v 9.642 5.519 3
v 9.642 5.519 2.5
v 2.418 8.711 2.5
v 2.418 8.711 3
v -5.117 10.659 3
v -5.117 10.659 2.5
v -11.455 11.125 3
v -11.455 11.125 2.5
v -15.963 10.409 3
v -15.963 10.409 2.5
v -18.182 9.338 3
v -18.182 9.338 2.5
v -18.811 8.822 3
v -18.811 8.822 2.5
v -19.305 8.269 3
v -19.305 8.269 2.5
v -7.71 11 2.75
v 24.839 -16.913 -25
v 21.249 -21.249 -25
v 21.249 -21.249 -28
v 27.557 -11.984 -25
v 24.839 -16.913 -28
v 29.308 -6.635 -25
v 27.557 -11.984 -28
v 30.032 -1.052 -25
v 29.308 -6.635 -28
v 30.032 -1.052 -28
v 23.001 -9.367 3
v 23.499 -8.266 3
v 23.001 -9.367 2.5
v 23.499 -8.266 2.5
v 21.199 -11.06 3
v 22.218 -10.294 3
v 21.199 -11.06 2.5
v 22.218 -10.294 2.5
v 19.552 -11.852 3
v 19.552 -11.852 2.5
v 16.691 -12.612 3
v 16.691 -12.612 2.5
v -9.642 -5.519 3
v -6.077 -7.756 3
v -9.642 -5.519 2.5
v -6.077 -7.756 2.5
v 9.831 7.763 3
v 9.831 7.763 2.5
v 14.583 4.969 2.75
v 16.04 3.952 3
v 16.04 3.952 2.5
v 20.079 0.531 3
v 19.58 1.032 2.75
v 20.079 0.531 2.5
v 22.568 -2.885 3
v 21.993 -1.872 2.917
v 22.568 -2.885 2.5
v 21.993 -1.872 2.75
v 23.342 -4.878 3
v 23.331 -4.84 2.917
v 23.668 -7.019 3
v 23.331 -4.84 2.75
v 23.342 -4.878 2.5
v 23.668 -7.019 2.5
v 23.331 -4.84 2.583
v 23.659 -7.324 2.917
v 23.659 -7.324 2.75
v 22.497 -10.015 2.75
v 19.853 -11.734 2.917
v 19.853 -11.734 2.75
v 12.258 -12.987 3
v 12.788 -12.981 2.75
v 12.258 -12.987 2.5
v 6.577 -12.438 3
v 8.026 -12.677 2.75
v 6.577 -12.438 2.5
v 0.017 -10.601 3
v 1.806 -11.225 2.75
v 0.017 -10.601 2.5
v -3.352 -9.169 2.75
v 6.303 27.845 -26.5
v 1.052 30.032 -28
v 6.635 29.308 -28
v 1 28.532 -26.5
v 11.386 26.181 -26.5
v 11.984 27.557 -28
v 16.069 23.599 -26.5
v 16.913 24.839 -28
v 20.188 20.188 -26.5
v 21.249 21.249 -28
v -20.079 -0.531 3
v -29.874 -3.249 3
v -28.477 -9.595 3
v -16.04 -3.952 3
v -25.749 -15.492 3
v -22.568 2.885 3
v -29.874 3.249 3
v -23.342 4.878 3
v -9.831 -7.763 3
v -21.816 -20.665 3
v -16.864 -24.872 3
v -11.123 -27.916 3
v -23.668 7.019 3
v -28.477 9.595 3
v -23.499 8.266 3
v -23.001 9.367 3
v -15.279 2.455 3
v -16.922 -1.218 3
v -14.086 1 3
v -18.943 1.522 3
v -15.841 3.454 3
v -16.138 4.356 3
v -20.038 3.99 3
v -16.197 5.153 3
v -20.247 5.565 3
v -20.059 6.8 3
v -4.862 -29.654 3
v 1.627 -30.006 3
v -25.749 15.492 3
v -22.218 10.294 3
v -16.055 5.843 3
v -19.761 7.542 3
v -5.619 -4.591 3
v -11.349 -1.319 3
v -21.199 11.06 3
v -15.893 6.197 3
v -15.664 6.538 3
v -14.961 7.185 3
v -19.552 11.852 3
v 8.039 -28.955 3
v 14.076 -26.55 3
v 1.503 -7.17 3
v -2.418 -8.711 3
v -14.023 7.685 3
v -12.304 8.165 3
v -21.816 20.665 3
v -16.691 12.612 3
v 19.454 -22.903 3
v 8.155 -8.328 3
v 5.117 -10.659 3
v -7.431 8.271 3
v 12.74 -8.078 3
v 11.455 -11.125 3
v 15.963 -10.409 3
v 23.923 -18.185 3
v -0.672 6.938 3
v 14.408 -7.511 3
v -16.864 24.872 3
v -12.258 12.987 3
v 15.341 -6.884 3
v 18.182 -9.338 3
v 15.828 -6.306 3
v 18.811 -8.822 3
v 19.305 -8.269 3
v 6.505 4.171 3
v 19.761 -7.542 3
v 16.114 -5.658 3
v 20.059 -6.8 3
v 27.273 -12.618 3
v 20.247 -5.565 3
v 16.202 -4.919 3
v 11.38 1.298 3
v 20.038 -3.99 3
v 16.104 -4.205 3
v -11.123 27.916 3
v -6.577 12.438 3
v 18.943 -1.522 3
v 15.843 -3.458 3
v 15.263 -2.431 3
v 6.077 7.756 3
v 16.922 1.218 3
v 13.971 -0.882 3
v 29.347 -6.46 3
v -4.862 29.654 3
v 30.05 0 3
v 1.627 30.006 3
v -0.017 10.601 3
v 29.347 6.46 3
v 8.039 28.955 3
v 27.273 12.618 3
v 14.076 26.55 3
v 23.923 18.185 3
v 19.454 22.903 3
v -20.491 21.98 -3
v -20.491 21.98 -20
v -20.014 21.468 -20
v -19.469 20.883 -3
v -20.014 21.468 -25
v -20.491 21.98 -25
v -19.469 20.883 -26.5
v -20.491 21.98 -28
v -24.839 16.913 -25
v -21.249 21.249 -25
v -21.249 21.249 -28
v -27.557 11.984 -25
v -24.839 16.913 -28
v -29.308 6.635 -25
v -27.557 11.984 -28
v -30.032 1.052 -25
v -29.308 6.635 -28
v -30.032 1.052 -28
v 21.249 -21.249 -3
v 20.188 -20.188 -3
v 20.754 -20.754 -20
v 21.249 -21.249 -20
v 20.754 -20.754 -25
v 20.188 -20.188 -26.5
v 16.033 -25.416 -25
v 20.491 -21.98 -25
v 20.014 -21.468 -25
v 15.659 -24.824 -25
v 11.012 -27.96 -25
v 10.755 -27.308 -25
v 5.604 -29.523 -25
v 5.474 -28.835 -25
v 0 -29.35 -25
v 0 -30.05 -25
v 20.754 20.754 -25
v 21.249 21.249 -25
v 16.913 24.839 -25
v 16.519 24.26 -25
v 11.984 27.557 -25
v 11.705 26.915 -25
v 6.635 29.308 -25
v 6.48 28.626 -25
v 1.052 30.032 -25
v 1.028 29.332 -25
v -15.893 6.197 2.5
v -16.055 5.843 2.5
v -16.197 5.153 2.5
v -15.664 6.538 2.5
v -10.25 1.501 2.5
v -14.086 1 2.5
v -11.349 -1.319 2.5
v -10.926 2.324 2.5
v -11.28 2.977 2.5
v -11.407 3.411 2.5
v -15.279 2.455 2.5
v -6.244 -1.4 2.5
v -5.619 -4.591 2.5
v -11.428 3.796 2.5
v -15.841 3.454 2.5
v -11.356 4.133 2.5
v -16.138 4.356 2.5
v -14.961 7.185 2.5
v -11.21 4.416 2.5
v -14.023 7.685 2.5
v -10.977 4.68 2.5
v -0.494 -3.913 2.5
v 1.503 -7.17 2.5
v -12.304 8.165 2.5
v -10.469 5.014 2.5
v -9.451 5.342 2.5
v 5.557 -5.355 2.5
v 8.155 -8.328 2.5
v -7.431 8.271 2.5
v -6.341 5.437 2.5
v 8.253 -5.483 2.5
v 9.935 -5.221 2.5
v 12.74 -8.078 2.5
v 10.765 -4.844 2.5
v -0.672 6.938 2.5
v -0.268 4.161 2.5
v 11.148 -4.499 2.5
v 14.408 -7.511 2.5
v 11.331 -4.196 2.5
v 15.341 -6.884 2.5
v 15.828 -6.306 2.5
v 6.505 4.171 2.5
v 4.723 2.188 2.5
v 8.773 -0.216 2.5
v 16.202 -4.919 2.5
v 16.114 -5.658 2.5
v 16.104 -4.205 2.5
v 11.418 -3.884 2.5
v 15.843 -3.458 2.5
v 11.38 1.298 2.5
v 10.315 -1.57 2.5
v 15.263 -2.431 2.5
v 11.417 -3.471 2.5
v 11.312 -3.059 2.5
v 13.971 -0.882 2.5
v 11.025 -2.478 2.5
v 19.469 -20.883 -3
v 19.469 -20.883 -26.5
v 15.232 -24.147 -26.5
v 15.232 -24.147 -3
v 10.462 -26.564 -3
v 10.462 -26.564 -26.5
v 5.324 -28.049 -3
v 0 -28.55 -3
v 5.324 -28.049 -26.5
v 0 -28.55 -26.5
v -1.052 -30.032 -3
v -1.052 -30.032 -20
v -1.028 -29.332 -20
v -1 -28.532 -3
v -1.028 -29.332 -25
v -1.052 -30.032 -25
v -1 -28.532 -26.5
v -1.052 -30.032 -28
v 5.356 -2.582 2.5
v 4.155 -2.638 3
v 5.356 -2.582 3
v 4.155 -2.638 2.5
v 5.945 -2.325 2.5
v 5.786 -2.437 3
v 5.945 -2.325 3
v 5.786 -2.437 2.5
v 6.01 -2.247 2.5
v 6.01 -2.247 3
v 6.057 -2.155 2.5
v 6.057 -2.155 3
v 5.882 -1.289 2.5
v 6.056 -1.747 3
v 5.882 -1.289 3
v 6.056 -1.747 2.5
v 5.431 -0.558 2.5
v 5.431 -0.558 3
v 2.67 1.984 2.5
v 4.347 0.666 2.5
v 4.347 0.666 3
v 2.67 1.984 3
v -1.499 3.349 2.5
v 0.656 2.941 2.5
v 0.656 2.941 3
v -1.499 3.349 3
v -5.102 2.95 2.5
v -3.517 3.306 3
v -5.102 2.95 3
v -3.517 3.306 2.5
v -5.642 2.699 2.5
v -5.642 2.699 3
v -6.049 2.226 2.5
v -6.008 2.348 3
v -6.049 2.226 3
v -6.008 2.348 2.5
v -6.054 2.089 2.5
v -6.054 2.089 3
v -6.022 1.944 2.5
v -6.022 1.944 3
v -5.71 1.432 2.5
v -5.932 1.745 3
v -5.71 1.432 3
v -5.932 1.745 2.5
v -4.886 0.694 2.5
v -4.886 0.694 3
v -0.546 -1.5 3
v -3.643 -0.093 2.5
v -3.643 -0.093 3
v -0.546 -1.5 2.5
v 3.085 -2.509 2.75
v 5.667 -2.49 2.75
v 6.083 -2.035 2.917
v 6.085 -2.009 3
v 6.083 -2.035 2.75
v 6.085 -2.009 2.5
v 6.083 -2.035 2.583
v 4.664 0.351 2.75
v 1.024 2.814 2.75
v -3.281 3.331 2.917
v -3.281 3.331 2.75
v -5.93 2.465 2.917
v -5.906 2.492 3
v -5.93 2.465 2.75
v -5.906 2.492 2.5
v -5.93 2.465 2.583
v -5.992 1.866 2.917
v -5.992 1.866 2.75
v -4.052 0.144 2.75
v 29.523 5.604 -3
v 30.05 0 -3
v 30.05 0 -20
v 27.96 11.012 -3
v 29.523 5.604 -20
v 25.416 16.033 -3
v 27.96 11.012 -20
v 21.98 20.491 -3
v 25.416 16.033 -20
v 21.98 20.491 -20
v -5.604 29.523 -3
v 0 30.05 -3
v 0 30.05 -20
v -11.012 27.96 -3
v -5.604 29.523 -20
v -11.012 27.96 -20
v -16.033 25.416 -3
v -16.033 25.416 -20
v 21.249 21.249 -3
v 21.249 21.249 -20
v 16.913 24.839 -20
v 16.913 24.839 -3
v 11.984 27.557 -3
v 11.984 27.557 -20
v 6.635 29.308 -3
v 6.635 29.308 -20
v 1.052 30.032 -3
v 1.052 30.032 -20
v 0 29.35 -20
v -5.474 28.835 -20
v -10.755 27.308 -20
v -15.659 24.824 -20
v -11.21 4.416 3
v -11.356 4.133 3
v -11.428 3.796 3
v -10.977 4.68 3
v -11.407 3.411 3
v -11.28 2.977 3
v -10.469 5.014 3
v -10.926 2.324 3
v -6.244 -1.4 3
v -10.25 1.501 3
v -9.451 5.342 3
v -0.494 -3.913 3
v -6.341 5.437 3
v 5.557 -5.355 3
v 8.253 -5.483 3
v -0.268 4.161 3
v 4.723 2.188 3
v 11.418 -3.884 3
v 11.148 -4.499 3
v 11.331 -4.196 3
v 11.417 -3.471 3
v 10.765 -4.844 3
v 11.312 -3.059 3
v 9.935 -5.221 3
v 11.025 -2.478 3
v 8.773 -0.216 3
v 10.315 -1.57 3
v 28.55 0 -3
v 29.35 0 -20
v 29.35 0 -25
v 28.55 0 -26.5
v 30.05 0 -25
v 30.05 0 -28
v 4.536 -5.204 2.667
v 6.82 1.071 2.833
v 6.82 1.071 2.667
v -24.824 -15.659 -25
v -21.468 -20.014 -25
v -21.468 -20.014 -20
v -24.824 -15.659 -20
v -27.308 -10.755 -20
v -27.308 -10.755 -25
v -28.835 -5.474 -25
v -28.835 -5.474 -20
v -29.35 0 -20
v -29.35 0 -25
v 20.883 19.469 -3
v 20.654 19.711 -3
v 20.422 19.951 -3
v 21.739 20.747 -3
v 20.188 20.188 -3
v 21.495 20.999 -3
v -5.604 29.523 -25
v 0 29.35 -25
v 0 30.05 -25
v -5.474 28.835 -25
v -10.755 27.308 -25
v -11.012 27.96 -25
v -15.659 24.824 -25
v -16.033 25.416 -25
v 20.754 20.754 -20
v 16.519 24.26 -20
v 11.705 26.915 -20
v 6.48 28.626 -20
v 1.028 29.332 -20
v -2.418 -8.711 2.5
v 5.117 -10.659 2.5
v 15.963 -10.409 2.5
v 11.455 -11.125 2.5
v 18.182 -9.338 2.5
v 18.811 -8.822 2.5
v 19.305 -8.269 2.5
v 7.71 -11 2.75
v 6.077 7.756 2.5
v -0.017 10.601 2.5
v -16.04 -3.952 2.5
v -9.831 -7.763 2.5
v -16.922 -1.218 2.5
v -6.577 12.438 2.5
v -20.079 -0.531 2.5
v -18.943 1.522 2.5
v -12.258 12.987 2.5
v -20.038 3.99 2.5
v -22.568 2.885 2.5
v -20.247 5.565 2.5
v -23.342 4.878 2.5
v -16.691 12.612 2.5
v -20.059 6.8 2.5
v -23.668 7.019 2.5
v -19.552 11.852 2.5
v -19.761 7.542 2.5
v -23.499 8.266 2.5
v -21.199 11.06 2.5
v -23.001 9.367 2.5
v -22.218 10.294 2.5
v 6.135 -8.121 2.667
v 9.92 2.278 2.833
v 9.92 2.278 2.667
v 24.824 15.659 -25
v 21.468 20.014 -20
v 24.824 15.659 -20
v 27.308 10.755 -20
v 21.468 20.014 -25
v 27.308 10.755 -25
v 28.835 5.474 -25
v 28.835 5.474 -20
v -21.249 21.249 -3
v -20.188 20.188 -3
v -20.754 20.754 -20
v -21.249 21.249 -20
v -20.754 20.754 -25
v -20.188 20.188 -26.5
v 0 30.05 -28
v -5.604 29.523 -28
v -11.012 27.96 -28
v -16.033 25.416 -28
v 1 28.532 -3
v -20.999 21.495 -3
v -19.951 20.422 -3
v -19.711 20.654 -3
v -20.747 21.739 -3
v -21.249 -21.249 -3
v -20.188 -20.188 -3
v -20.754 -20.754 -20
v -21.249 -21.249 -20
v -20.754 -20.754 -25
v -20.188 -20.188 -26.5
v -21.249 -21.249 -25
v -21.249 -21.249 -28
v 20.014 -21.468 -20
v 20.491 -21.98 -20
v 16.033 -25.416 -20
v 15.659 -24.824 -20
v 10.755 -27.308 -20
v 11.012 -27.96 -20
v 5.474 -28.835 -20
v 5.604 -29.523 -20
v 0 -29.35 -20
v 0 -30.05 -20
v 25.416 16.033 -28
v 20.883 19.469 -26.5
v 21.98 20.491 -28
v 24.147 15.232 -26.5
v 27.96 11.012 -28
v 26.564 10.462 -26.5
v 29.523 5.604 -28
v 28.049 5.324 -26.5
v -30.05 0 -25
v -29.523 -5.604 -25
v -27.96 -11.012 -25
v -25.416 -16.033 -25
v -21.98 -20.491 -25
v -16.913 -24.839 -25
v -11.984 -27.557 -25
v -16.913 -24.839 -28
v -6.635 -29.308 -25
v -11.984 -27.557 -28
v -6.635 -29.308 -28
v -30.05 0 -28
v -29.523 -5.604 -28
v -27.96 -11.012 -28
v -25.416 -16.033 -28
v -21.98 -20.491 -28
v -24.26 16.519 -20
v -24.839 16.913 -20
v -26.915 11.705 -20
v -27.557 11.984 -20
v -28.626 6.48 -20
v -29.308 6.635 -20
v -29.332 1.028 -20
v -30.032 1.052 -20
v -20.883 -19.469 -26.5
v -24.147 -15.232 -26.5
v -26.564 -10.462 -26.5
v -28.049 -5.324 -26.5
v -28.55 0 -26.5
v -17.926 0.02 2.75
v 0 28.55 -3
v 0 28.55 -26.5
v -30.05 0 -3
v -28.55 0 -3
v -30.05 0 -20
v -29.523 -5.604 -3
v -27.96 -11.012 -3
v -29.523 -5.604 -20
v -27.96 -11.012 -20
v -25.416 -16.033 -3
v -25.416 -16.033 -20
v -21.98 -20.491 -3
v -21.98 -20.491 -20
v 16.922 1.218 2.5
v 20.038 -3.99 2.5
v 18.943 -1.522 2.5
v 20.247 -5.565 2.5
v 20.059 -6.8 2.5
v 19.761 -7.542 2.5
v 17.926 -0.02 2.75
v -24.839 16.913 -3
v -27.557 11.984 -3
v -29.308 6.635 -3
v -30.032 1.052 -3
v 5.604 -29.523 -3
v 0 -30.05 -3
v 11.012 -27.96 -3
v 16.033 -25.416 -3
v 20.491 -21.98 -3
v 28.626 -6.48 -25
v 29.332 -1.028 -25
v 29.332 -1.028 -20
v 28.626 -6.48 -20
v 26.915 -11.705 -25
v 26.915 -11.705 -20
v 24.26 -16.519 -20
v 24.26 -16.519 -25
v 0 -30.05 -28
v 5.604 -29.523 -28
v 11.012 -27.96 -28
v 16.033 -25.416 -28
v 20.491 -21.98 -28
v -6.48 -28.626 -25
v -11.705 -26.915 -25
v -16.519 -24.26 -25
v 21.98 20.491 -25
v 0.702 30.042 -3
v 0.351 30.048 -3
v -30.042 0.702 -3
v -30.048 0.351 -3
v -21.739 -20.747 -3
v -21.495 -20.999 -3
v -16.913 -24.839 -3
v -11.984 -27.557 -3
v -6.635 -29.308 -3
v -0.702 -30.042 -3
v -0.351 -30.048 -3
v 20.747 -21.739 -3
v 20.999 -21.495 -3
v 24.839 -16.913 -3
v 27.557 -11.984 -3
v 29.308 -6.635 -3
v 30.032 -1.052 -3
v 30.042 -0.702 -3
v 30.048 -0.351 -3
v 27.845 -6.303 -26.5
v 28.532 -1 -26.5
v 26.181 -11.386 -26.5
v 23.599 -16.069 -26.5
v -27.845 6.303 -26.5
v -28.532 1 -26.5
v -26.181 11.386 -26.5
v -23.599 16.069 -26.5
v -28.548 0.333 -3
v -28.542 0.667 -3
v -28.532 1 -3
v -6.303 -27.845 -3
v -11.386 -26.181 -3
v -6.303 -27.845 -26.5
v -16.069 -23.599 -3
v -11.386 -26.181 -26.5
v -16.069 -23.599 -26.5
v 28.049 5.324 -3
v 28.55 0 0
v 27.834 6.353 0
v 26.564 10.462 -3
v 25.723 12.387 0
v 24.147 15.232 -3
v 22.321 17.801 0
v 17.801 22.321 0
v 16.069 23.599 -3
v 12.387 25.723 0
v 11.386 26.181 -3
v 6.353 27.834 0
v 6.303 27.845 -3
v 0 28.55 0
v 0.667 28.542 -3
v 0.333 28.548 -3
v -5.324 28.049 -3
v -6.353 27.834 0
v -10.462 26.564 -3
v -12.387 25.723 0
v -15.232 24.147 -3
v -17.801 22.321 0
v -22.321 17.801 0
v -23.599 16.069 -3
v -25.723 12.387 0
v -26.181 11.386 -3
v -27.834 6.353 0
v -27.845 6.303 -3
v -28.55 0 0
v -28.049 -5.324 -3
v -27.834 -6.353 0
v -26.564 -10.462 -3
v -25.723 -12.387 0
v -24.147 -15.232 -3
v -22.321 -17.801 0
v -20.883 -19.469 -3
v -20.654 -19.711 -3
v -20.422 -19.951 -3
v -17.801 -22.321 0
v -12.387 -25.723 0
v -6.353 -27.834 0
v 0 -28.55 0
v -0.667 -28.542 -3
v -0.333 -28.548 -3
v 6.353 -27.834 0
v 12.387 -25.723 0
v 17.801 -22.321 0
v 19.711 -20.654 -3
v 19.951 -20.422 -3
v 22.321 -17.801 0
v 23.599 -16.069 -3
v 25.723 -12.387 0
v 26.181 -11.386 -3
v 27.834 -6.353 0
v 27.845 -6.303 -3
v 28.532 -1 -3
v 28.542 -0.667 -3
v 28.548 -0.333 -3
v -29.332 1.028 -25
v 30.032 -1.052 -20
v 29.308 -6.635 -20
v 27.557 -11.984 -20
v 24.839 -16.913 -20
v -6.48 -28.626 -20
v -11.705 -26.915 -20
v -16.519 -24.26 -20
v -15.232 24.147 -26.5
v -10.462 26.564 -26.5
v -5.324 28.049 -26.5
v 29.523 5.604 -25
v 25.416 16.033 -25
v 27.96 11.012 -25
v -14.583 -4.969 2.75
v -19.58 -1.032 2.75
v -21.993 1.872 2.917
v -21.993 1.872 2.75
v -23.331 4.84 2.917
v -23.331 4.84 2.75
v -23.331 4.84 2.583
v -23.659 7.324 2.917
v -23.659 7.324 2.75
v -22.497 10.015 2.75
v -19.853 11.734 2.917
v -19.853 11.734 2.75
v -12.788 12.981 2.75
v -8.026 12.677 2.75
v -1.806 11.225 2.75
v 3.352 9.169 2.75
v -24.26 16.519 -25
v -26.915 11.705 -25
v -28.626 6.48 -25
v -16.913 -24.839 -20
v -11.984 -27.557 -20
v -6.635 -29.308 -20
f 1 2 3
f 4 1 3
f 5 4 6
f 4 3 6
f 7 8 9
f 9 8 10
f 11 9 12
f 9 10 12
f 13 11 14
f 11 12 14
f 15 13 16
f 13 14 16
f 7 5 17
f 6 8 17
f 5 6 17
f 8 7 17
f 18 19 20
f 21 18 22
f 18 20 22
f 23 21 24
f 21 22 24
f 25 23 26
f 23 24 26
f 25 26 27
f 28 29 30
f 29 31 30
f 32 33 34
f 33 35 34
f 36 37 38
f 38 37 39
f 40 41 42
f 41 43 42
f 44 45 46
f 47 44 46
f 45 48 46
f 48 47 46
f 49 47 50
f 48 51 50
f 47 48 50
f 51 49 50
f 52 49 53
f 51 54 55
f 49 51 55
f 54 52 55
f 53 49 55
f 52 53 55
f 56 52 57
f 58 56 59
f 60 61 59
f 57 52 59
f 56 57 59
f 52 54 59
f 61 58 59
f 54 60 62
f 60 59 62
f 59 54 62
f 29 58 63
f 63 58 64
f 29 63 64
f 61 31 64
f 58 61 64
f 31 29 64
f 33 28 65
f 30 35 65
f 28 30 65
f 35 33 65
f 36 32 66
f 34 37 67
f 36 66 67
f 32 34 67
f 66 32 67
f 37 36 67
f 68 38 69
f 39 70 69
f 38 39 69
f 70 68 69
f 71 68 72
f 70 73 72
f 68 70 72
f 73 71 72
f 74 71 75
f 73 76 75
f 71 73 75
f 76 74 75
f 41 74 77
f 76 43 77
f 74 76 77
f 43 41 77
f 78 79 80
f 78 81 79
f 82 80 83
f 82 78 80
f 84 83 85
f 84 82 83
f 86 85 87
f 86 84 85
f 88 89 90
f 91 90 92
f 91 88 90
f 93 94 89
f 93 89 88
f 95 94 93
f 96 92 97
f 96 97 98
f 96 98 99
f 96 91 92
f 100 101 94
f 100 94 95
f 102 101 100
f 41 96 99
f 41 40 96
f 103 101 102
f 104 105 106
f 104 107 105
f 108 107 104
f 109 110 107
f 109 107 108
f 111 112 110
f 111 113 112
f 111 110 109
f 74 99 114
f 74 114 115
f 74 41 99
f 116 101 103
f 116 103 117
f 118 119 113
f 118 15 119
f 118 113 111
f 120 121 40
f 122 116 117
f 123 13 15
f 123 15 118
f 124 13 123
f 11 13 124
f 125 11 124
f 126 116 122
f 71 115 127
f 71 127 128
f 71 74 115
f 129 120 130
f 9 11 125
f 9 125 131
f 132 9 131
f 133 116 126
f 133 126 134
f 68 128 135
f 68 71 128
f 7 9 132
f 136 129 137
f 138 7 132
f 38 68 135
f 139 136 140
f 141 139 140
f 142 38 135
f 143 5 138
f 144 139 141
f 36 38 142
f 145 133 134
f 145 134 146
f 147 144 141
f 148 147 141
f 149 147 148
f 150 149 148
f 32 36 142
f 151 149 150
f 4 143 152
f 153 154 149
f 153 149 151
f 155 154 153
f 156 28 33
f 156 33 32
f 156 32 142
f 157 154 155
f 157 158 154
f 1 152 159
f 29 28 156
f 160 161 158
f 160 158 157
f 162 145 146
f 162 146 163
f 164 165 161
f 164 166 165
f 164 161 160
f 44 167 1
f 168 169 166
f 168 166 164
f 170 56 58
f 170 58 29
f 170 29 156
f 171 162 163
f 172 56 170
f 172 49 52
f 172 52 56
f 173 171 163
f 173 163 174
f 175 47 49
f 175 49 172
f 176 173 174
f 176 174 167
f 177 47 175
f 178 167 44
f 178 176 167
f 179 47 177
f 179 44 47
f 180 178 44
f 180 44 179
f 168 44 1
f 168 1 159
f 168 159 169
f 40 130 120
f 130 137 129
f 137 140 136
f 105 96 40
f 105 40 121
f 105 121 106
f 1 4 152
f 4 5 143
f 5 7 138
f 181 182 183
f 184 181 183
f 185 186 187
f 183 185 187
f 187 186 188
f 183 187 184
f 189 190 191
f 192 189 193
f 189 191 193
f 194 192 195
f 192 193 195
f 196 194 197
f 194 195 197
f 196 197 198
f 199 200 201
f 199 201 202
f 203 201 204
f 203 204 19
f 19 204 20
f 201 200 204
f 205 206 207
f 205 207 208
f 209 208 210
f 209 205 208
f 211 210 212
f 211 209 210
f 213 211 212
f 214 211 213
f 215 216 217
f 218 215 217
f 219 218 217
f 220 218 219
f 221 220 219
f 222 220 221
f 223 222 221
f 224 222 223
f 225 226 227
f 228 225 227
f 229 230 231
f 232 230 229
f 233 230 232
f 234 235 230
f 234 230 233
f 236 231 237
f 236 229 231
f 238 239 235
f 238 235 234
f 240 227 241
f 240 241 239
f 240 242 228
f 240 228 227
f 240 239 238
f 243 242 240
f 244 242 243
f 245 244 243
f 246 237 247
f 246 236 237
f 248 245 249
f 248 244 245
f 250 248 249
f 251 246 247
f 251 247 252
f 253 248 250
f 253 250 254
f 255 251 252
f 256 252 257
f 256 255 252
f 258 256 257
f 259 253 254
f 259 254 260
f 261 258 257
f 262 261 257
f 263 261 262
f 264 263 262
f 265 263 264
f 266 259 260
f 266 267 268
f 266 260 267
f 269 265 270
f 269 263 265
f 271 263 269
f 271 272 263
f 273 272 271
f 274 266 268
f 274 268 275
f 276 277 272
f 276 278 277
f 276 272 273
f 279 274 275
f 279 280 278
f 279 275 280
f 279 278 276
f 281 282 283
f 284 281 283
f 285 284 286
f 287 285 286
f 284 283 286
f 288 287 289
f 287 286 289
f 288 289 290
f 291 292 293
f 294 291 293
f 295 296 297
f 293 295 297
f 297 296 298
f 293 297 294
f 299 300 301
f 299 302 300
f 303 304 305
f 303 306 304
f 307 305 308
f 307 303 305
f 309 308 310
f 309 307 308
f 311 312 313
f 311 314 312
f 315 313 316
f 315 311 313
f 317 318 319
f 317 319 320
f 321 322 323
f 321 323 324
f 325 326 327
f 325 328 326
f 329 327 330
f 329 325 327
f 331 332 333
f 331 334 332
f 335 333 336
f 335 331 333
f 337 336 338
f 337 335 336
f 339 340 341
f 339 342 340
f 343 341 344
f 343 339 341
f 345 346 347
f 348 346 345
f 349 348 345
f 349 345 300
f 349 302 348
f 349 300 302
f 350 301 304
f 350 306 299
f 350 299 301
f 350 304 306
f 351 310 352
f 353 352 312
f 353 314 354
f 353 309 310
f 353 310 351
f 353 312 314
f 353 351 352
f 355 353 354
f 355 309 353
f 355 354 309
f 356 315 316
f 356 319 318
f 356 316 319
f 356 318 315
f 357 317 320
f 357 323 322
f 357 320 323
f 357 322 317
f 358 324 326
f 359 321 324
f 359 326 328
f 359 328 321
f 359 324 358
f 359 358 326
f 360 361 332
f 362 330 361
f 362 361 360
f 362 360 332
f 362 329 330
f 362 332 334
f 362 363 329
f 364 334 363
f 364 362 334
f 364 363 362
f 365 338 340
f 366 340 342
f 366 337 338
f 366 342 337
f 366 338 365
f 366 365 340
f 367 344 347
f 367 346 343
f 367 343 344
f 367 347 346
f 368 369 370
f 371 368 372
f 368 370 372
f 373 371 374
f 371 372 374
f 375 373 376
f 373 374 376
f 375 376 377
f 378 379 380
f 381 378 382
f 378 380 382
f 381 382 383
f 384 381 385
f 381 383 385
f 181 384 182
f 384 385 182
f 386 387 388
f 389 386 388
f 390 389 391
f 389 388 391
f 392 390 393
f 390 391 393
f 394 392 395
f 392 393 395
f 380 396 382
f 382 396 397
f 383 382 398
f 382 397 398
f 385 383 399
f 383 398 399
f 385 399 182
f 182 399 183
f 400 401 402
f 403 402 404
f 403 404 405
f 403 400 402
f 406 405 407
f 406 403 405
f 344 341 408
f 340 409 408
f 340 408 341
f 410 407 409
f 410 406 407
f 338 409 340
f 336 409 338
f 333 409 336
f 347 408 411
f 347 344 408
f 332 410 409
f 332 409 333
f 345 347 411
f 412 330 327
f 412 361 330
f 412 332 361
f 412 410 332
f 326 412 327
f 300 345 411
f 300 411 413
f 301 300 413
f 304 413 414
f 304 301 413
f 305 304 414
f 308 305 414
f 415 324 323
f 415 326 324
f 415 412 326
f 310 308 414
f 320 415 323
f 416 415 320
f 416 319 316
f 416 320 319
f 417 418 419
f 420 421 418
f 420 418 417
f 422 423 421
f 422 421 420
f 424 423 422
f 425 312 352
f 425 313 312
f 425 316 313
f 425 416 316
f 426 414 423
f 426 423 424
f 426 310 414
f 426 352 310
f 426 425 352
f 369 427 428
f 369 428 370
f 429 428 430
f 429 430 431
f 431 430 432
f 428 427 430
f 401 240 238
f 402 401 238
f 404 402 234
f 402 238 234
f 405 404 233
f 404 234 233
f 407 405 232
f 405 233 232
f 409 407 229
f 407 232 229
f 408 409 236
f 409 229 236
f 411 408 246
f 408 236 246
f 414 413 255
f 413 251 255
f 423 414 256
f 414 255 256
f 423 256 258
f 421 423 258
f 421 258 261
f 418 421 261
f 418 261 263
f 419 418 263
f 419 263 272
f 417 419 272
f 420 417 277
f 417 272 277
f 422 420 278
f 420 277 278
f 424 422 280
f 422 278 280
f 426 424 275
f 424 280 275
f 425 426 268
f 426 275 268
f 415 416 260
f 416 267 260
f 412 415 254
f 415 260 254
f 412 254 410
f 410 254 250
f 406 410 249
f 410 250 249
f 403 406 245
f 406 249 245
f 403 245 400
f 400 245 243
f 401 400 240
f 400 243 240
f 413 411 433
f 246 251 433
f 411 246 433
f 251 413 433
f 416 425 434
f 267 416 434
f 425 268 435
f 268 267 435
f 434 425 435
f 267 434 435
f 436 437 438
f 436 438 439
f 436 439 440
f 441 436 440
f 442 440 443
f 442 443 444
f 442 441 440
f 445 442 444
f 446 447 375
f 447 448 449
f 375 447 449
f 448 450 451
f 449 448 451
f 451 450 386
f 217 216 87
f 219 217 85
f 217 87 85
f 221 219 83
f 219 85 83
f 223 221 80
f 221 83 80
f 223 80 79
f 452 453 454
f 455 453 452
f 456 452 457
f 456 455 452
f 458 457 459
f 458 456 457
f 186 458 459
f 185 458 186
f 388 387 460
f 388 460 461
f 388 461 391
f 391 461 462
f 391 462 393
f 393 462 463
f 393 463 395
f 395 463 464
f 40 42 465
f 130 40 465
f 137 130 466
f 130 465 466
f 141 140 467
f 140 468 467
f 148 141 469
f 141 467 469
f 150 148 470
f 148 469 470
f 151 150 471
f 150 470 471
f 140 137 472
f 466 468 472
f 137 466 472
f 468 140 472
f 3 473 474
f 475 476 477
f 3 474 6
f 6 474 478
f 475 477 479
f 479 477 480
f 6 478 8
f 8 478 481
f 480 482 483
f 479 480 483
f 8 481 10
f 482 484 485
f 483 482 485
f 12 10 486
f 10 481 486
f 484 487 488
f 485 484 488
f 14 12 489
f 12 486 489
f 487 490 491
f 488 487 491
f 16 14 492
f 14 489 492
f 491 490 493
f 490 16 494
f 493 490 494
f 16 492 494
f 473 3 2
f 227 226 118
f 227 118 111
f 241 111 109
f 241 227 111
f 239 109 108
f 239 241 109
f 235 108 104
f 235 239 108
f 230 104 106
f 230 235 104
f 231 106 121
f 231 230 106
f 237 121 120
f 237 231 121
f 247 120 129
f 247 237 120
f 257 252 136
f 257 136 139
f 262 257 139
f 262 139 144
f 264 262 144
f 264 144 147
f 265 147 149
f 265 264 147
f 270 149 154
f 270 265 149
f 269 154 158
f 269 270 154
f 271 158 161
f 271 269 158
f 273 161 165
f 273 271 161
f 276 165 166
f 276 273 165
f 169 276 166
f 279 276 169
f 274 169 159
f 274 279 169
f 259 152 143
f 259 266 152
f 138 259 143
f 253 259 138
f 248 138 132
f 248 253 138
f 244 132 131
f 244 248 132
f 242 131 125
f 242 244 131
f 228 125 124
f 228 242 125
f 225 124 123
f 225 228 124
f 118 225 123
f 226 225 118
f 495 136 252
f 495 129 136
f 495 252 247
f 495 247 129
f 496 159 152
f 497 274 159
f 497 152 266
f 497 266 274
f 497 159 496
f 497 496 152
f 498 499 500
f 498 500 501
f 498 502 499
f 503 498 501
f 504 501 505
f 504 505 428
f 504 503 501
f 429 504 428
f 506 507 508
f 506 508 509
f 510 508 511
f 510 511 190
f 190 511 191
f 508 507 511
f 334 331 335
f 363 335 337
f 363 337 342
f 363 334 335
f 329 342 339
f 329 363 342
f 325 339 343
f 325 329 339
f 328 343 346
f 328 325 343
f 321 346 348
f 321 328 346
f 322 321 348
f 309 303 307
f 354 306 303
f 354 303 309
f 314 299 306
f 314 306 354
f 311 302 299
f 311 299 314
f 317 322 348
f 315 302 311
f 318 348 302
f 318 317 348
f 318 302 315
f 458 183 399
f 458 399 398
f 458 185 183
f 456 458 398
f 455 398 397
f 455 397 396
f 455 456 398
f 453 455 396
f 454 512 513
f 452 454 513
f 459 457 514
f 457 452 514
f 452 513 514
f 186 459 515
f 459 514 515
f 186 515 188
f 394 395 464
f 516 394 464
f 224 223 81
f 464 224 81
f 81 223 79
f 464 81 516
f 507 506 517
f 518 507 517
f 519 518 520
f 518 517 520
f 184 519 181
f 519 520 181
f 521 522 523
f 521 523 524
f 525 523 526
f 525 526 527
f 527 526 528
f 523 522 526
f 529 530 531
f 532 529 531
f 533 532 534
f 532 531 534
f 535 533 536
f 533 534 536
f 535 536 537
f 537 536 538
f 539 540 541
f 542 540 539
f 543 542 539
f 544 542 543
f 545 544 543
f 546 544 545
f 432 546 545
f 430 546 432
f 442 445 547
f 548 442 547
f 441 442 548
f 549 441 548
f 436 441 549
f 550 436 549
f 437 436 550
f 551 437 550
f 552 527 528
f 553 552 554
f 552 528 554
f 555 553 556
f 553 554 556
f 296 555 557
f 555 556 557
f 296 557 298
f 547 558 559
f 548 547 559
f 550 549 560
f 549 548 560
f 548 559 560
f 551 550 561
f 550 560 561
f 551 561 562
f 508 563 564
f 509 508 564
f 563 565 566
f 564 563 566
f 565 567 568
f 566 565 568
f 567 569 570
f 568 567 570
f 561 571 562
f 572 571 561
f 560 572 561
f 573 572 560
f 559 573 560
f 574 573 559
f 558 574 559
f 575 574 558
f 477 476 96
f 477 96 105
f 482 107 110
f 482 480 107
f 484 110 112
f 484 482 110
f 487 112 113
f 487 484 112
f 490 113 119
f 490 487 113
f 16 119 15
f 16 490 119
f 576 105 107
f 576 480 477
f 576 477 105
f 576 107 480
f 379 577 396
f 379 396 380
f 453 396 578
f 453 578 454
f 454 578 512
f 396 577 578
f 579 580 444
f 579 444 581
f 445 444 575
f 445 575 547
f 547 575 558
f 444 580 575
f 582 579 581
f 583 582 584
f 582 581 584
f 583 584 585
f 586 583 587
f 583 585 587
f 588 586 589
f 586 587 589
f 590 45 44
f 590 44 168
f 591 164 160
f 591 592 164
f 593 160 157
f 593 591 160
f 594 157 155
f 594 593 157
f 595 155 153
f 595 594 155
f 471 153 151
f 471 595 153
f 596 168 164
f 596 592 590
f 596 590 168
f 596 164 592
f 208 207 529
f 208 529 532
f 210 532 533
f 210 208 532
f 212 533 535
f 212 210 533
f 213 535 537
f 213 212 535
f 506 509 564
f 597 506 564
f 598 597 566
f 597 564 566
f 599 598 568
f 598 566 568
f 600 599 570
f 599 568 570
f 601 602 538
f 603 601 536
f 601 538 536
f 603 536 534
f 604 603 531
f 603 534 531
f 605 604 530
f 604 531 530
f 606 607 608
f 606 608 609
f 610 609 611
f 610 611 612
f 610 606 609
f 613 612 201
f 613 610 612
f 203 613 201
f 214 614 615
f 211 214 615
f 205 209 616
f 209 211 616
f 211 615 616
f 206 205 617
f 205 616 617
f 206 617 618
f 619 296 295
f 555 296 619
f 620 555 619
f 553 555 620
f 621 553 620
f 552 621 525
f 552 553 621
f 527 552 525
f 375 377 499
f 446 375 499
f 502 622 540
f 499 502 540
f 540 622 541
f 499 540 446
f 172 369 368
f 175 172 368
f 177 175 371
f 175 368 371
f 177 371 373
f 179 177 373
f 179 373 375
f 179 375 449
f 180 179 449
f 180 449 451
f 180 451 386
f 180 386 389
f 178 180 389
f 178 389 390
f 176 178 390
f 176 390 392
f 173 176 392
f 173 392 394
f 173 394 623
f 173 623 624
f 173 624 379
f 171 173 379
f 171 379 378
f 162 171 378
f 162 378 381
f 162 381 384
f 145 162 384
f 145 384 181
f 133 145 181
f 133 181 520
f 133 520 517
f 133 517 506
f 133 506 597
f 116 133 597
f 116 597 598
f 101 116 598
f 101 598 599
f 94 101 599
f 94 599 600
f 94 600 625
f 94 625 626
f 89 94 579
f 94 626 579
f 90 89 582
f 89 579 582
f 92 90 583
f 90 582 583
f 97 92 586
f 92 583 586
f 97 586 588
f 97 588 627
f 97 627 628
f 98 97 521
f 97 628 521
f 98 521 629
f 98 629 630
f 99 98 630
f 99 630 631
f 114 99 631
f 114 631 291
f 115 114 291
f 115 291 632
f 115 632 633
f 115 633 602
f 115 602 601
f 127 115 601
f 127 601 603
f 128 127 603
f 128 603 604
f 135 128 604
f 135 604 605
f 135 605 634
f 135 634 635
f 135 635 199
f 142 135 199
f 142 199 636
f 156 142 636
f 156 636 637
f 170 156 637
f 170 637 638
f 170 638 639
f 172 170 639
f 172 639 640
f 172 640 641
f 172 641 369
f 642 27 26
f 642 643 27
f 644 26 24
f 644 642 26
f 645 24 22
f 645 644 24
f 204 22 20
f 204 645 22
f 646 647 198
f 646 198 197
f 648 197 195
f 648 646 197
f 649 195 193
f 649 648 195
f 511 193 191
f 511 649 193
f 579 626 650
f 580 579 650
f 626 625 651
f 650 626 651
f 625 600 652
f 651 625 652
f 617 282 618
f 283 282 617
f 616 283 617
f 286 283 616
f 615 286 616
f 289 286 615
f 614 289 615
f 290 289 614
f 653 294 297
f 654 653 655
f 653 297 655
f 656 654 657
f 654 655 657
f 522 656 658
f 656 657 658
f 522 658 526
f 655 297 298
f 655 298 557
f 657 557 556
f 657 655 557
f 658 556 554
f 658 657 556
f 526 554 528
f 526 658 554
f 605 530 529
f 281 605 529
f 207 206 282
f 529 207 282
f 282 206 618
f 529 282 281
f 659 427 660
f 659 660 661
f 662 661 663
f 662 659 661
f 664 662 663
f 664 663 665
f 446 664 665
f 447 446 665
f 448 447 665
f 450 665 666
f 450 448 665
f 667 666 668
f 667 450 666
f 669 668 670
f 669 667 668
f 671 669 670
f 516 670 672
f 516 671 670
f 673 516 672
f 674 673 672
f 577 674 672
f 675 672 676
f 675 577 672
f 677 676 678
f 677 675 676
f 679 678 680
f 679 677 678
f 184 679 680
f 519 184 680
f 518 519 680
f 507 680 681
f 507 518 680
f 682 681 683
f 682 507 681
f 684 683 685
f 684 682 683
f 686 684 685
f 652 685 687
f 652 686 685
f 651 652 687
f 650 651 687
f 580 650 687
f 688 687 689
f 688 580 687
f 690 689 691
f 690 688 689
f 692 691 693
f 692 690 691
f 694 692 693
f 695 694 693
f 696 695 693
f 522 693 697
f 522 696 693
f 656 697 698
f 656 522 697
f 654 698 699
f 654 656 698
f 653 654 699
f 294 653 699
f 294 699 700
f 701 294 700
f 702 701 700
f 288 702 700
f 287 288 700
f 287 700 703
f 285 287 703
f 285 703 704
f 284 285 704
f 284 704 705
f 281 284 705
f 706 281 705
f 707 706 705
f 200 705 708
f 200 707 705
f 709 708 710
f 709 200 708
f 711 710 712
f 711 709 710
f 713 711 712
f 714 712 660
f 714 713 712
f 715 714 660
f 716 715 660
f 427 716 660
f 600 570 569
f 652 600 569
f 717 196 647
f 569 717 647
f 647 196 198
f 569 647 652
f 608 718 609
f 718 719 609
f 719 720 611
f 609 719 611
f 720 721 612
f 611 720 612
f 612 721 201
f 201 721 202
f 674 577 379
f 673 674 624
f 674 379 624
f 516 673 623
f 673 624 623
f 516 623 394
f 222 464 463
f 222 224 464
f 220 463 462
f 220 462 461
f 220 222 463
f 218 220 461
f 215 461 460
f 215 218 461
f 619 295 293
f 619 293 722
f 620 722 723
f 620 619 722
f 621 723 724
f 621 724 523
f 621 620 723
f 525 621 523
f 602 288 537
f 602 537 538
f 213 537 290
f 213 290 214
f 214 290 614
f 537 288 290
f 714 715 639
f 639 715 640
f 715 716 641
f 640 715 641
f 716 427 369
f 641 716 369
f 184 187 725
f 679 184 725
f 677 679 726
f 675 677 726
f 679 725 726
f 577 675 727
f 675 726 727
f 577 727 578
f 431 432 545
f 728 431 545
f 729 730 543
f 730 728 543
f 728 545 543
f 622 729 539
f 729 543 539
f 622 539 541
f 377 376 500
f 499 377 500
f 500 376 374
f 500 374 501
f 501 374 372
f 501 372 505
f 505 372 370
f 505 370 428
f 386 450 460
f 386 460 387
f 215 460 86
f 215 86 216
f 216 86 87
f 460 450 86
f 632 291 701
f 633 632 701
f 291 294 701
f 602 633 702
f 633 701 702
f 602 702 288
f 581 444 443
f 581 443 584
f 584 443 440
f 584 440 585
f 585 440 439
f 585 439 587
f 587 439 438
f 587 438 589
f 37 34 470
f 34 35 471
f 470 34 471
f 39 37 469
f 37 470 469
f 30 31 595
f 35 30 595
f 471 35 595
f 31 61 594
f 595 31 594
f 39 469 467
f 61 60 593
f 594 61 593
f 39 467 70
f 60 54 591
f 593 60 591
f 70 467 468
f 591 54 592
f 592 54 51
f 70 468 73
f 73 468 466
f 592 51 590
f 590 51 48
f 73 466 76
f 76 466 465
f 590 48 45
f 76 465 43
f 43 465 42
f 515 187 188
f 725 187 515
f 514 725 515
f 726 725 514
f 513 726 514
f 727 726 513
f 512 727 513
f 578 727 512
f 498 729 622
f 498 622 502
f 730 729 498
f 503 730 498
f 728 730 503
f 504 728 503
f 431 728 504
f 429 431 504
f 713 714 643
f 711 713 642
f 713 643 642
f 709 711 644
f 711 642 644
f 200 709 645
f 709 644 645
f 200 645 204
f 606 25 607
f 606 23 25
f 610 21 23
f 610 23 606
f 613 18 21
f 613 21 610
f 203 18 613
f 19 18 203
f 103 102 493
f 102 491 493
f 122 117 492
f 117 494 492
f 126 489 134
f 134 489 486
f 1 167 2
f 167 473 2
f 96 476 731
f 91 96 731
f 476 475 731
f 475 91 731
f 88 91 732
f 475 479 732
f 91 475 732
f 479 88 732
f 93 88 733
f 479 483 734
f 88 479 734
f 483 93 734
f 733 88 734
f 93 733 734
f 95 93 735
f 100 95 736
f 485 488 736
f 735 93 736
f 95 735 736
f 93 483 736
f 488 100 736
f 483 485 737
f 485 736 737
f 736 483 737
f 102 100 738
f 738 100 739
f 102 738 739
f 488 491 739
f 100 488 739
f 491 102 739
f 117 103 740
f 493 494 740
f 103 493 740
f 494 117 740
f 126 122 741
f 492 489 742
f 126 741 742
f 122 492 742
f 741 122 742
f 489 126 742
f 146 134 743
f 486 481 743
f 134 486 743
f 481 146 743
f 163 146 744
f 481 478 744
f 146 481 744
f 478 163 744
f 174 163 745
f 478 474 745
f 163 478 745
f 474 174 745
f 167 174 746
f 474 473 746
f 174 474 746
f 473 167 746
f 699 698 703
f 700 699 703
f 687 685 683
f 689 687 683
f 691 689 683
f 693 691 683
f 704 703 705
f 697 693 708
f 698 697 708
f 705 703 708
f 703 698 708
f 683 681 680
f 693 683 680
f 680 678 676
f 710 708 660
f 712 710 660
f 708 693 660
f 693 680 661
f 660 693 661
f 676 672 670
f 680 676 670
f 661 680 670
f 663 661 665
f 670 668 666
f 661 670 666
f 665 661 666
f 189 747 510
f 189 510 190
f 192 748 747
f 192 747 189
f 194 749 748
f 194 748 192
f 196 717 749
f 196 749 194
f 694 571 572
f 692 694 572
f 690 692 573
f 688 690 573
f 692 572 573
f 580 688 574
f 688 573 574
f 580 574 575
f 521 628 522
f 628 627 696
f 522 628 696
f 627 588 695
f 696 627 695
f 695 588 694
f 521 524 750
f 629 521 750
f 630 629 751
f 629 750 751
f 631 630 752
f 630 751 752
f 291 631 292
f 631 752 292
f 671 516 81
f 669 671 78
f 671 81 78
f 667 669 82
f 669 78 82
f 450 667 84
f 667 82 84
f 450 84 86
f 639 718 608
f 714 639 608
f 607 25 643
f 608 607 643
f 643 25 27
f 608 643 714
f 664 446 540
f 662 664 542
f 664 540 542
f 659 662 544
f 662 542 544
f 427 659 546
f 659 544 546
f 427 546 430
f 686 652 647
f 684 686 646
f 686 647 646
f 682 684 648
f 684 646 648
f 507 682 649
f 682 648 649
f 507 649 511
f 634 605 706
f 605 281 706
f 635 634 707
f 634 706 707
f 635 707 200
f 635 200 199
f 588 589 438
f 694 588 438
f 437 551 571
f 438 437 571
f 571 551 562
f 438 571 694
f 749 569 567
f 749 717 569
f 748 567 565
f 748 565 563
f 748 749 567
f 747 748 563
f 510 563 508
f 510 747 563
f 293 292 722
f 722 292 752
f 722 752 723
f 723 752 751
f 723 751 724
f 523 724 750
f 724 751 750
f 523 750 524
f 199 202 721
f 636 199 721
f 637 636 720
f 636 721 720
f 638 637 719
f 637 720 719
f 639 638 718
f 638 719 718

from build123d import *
from build123d.topology import SkipClean

# Parameters (mm, degrees)
SKETCH1_R           = 30.05
SKETCH1_R_2         = 28.55
BOSS_EXTRUDE1_DEPTH = 3
BOSS_EXTRUDE2_START = -3
SKETCH1_3_R         = 30.05
SKETCH1_3_R_2       = 28.55
BOSS_EXTRUDE2_DEPTH = 3
BOSS_EXTRUDE3_START = 25
BOSS_EXTRUDE3_DEPTH = 25
SKETCH4_W           = 0.7
SKETCH4_H           = 5
CUT_EXTRUDE1_START  = -0.5
CUT_EXTRUDE1_DEPTH  = 0.5


# Read off the part's stored shape, not the designer's step: Cut-Extrude1
with BuildPart() as part:
    # Sketch1 → Boss-Extrude1 (new body)
    # profile 1 of 2: a face of its own
    with BuildSketch(Plane.XY):
        Circle(SKETCH1_R)
        Circle(SKETCH1_R_2, mode=Mode.SUBTRACT)
    # profile 2 of 2: a face of its own
    with BuildSketch(Plane.XY):
        Circle(SKETCH1_R_2)
    extrude(amount=BOSS_EXTRUDE1_DEPTH)

    # Sketch1<3> → Boss-Extrude2 (add)
    with BuildSketch(Plane.XY.offset(BOSS_EXTRUDE2_START)):
        Circle(SKETCH1_3_R)
        Circle(SKETCH1_3_R_2, mode=Mode.SUBTRACT)
    extrude(amount=BOSS_EXTRUDE2_DEPTH)

    # Sketch3 → Boss-Extrude3 (add)
    with SkipClean():  # the faces are left unmerged after this step: merging them gives an invalid solid
        with BuildSketch(Plane(origin=(0, 0, -3), x_dir=(-1, 0, 0), z_dir=(0, 0, -1)).offset(BOSS_EXTRUDE3_START)):
            with BuildLine():
                Line((20.491380882, 21.979668094), (19.468516612, 20.882513281))
                ThreePointArc((19.468516612, 20.882513281), (10.461996603, 26.564057052), (0, 28.55))
                Line((0, 28.55), (0, 30.05))
                ThreePointArc((0, 30.05), (11.011663675, 27.959716793), (20.491380882, 21.979668094))
            make_face()
            with BuildLine():
                Line((30.031566735, 1.05237798), (28.532486865, 0.999846633))
                ThreePointArc((28.532486865, 0.999846633), (26.18137362, 11.385876135), (20.187898603, 20.187898603))
                Line((20.187898603, 20.187898603), (21.248558775, 21.248558775))
                ThreePointArc((21.248558775, 21.248558775), (27.5569274, 11.984083288), (30.031566735, 1.05237798))
            make_face()
            with BuildLine():
                Line((21.979668094, -20.491380882), (20.882513281, -19.468516612))
                ThreePointArc((20.882513281, -19.468516612), (26.564057052, -10.461996603), (28.55, 0))
                Line((28.55, 0), (30.05, 0))
                ThreePointArc((30.05, 0), (27.959716793, -11.011663675), (21.979668094, -20.491380882))
            make_face()
            with BuildLine():
                Line((1.05237798, -30.031566735), (0.999846633, -28.532486865))
                ThreePointArc((0.999846633, -28.532486865), (11.385876135, -26.18137362), (20.187898603, -20.187898603))
                Line((20.187898603, -20.187898603), (21.248558775, -21.248558775))
                ThreePointArc((21.248558775, -21.248558775), (11.984083288, -27.5569274), (1.05237798, -30.031566735))
            make_face()
            with BuildLine():
                Line((-20.491380882, -21.979668094), (-19.468516612, -20.882513281))
                ThreePointArc((-19.468516612, -20.882513281), (-10.461996603, -26.564057052), (0, -28.55))
                Line((0, -28.55), (0, -30.05))
                ThreePointArc((0, -30.05), (-11.011663675, -27.959716793), (-20.491380882, -21.979668094))
            make_face()
            with BuildLine():
                Line((-30.031566735, -1.05237798), (-28.532486865, -0.999846633))
                ThreePointArc((-28.532486865, -0.999846633), (-26.18137362, -11.385876135), (-20.187898603, -20.187898603))
                Line((-20.187898603, -20.187898603), (-21.248558775, -21.248558775))
                ThreePointArc((-21.248558775, -21.248558775), (-27.5569274, -11.984083288), (-30.031566735, -1.05237798))
            make_face()
            with BuildLine():
                Line((-21.979668094, 20.491380882), (-20.882513281, 19.468516612))
                ThreePointArc((-20.882513281, 19.468516612), (-26.564057052, 10.461996603), (-28.55, 0))
                Line((-28.55, 0), (-30.05, 0))
                ThreePointArc((-30.05, 0), (-27.959716793, 11.011663675), (-21.979668094, 20.491380882))
            make_face()
            with BuildLine():
                Line((-1.05237798, 30.031566735), (-0.999846633, 28.532486865))
                ThreePointArc((-0.999846633, 28.532486865), (-11.385876135, 26.18137362), (-20.187898603, 20.187898603))
                Line((-20.187898603, 20.187898603), (-21.248558775, 21.248558775))
                ThreePointArc((-21.248558775, 21.248558775), (-11.984083288, 27.5569274), (-1.05237798, 30.031566735))
            make_face()
        extrude(amount=-BOSS_EXTRUDE3_DEPTH)

    # Sketch4 → Cut-Revolve1 (revolve, cut)
    with SkipClean():  # the faces are left unmerged after this step: merging them gives an invalid solid
        with BuildSketch(Plane(origin=(0, 0, 0), x_dir=(1, 0, 0), z_dir=(0, 1, 0))):
            with Locations((29.7, 22.5)):
                Rectangle(SKETCH4_W, SKETCH4_H)
            Polygon((28.55, 26.5), (28.55, 28), (30.05, 28), align=None)
        revolve(axis=Axis((0, 0, 3), (0, 0, -1)), mode=Mode.SUBTRACT)

    # Cut-Extrude1 outline → Cut-Extrude1 (cut)
    # profile 1 of 4: a face of its own
    with SkipClean():  # the faces are left unmerged after this step: merging them gives an invalid solid
        with BuildSketch(Plane.XY.offset(3).offset(CUT_EXTRUDE1_START)):
            with BuildLine():
                add(Edge.make_bspline(
                    [(-9.831188481, -7.76286267), (-12.31509908, -6.564453694), (-19.945506052, -1.751090116), (-23.245520708, 3.604062551), (-24.465440518, 11.416266415), (-15.133909058, 13.3540246), (-0.220085461, 12.125105625), (7.518774259, 6.992670667), (9.641745648, 5.518604803)],
                    knots=[0, 0, 0, 0, 0.123562004, 0.211727559, 0.248485922, 0.454387264, 0.532112439, 1, 1, 1, 1], degree=3))
                add(Edge.make_bspline(
                    [(-9.831188481, -7.76286267), (-14.608290319, -3.536611009), (-17.897696817, -0.898578419), (-21.378258226, 5.519092244), (-19.304554183, 8.268748828)],
                    knots=[0, 0, 0, 0, 0.497115956, 0.99999998, 0.99999998, 0.99999998, 0.99999998], degree=3))
                add(Edge.make_bspline(
                    [(9.641745648, 5.518604803), (-12.302292658, 17.553494797), (-19.304554183, 8.268748828)],
                    knots=[1.224732712, 1.224732712, 1.224732712, 3.011762383, 3.011762383, 3.011762383], degree=2, weights=[1, 0.626676865, 1]))
            make_face()
        # profile 2 of 4: a face of its own
        with BuildSketch(Plane.XY.offset(3).offset(CUT_EXTRUDE1_START)):
            with BuildLine():
                add(Edge.make_bspline(
                    [(9.831188481, 7.76286267), (12.31509908, 6.564453694), (19.945506052, 1.751090116), (23.245520708, -3.604062551), (24.465440518, -11.416266415), (15.133909058, -13.3540246), (0.220085461, -12.125105625), (-7.518774259, -6.992670667), (-9.641745648, -5.518604803)],
                    knots=[0, 0, 0, 0, 0.123562004, 0.211727559, 0.248485922, 0.454387264, 0.532112439, 1, 1, 1, 1], degree=3))
                add(Edge.make_bspline(
                    [(9.831188481, 7.76286267), (14.608290319, 3.536611009), (17.897696883, 0.898578367), (21.378258365, -5.5190925), (19.304553936, -8.268749156)],
                    knots=[0, 0, 0, 0, 0.497115956, 1, 1, 1, 1], degree=3))
                add(Edge.make_bspline(
                    [(-9.641745648, -5.518604803), (12.302291673, -17.553494257), (19.304553936, -8.268749156)],
                    knots=[4.366325366, 4.366325366, 4.366325366, 6.153354993, 6.153354993, 6.153354993], degree=2, weights=[1, 0.626676882, 1]))
            make_face()
        # profile 3 of 4: a face of its own
        with BuildSketch(Plane.XY.offset(3).offset(CUT_EXTRUDE1_START)):
            with BuildLine():
                add(Edge.make_bspline(
                    [(-16.054779318, 5.843461789), (-19.839576992, -4.555184358), (6.134990822, -8.121053968), (32.109558636, -11.686923579), (9.919788496, 2.277592179), (-12.269981644, 16.242107937), (-16.054779318, 5.843461789)],
                    knots=[0, 0, 0, 2.094395102, 2.094395102, 4.188790205, 4.188790205, 6.283185307, 6.283185307, 6.283185307], degree=2, weights=[1, 0.5, 1, 0.5, 1, 0.5, 1]))
            make_face()
            with BuildLine():
                add(Edge.make_bspline(
                    [(-11.355964711, 4.133233136), (-13.640122053, -2.142437584), (4.535903685, -5.204451928), (22.711929422, -8.266466273), (6.820061027, 1.071218792), (-9.071807369, 10.408903856), (-11.355964711, 4.133233136)],
                    knots=[0, 0, 0, 2.094395102, 2.094395102, 4.188790205, 4.188790205, 6.283185307, 6.283185307, 6.283185307], degree=2, weights=[1, 0.5, 1, 0.5, 1, 0.5, 1]))
            make_face(mode=Mode.SUBTRACT)
        # profile 4 of 4: a face of its own
        with BuildSketch(Plane.XY.offset(3).offset(CUT_EXTRUDE1_START)):
            with BuildLine():
                add(Edge.make_bspline(
                    [(-0.545917498, -1.499895999), (1.967945144, -2.431945071), (5.077041498, -3.030895568), (6.737953902, -1.750447632), (1.605929106, 4.537470773), (-6.123195001, 3.076782229), (-6.04339485, 1.101123427), (-3.081000207, -0.559979297), (-0.545917498, -1.499895999)],
                    knots=[0, 0, 0, 0, 0.245515964, 0.295417536, 0.499015724, 0.702313155, 0.752411582, 1, 1, 1, 1], degree=3))
            make_face()
        extrude(amount=CUT_EXTRUDE1_DEPTH, mode=Mode.SUBTRACT)


solid = part.part
